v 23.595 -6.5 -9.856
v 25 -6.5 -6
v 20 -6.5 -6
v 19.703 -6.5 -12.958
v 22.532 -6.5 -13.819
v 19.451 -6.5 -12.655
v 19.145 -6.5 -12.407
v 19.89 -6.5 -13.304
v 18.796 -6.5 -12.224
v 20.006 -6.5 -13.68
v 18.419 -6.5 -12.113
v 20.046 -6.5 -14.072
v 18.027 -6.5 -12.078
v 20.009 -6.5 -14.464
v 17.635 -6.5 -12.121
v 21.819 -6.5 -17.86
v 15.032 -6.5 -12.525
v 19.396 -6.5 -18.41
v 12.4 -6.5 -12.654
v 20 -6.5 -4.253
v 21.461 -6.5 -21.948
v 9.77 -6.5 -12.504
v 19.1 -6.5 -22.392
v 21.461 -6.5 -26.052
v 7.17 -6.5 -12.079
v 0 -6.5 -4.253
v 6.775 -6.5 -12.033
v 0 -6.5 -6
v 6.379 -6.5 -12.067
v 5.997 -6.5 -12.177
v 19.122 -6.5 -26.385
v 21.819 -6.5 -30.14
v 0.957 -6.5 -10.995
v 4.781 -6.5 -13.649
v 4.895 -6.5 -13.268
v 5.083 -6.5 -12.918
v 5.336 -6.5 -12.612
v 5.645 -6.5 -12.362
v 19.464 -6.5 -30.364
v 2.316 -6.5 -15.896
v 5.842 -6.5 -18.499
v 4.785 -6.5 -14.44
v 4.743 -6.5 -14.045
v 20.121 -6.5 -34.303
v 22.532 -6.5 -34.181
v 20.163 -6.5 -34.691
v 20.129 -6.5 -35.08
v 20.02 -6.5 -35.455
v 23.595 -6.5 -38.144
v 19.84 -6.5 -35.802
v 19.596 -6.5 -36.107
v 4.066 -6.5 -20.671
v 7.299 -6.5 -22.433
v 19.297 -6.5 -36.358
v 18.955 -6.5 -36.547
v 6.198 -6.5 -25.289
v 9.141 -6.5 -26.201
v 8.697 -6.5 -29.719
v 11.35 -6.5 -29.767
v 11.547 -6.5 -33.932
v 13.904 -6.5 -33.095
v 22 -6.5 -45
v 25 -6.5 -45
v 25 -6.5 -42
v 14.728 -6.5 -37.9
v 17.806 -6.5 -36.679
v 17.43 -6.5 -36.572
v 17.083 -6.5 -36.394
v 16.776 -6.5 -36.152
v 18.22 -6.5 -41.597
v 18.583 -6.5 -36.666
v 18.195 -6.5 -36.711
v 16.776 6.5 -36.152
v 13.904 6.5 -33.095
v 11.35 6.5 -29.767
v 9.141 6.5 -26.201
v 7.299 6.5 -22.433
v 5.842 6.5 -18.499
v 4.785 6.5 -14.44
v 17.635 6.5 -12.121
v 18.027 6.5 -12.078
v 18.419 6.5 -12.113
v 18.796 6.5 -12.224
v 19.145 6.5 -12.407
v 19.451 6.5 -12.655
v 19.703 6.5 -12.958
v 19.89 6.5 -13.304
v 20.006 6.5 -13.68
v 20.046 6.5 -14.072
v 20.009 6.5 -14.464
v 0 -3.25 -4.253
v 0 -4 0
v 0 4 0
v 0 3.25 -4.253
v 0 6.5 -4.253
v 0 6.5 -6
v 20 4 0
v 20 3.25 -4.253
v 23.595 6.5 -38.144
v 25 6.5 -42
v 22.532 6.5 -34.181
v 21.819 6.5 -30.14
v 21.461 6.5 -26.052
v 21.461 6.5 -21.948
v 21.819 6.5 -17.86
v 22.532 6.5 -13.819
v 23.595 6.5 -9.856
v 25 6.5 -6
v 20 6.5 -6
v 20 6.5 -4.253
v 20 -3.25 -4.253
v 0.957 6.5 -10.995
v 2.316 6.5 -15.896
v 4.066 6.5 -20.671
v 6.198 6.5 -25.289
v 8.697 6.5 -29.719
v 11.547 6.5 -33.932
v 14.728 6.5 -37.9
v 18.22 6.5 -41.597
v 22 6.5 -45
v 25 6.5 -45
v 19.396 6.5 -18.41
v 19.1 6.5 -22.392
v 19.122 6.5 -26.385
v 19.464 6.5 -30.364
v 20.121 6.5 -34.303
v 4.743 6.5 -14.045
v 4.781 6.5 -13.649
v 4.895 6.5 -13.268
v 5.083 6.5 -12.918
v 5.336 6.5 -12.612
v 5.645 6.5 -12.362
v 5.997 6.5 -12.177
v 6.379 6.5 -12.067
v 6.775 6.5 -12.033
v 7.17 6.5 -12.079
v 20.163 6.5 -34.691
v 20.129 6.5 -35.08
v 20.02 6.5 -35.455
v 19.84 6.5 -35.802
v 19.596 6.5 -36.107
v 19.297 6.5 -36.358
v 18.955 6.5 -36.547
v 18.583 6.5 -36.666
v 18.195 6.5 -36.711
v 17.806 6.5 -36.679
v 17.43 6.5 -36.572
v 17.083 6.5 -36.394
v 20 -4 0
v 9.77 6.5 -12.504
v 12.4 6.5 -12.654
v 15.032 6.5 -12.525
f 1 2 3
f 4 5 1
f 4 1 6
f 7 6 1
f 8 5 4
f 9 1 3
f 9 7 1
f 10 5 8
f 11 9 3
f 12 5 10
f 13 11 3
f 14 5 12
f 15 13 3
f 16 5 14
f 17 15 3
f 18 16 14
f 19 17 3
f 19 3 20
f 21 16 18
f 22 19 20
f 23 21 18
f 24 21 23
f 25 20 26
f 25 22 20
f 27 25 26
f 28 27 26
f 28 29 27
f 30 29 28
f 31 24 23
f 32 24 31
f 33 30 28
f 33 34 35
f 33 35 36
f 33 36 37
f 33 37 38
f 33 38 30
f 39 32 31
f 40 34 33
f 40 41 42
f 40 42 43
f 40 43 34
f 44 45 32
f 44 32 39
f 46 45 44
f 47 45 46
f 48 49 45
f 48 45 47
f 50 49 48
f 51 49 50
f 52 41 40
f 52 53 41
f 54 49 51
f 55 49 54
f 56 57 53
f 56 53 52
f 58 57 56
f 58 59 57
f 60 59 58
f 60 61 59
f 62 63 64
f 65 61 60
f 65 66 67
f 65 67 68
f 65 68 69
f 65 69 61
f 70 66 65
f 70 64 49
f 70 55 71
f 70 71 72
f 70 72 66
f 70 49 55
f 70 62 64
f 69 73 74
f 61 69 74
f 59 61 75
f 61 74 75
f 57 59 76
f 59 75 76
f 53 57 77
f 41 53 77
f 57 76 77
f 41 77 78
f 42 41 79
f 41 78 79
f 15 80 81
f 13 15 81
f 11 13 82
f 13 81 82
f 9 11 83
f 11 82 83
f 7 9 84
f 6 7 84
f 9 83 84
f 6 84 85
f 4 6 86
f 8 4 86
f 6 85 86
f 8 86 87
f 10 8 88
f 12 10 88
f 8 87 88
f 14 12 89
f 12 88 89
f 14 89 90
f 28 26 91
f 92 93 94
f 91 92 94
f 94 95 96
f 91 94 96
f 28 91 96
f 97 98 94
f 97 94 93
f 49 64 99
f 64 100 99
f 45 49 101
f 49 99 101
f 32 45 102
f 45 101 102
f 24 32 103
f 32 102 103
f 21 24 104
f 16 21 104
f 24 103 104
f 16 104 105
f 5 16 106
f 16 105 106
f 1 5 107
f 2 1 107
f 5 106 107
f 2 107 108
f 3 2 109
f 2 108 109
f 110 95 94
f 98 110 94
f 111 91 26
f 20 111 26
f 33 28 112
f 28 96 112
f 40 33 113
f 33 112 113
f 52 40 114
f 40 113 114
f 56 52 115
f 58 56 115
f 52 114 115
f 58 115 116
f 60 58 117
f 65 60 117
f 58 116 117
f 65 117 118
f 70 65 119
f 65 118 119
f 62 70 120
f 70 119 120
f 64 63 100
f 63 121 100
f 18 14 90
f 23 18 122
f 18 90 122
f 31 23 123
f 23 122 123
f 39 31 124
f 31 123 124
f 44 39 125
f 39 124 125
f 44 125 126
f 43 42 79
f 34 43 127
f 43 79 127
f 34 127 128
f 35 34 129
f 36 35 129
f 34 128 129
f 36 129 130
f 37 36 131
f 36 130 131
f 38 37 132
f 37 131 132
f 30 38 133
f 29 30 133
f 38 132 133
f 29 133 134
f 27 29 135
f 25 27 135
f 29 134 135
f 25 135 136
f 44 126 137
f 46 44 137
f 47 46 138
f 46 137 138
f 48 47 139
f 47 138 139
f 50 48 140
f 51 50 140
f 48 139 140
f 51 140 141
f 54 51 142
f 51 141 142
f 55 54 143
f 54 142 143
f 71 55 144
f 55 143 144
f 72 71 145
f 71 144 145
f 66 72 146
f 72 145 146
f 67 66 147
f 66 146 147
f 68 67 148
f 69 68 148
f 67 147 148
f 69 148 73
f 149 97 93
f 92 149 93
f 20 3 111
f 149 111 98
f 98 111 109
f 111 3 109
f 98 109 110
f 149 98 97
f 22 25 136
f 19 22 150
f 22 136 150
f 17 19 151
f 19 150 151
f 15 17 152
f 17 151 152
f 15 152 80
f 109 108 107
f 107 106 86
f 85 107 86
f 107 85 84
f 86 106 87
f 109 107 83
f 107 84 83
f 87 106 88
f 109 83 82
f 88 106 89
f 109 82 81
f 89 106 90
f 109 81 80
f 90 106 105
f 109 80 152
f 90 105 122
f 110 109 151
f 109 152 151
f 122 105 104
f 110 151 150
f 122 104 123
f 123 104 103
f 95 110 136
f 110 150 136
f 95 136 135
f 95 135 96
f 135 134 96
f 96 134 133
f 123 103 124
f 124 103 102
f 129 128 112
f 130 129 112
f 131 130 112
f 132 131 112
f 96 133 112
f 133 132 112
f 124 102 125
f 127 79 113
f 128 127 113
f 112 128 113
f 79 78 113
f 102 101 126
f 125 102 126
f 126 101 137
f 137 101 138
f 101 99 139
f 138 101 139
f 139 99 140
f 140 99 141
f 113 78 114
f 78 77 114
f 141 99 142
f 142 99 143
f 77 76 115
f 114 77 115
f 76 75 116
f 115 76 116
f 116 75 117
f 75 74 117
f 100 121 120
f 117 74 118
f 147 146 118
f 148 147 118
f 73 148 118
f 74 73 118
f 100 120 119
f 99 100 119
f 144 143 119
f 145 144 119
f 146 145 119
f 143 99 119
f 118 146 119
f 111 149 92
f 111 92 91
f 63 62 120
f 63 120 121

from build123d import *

# Parameters (mm, degrees)
EXTRUDE_1_DEPTH     = 6.5
CUT_EXTRUDE_1_DEPTH = 52.886896226
CUT_EXTRUDE_2_DEPTH = 54.09425581


with BuildPart() as part:
    # 草图1 → 凸台-拉伸1 (new, symmetric)
    with BuildSketch(Plane(origin=(0, 0, 0), x_dir=(1, 0, 0), z_dir=(0, 1, 0))):
        with BuildLine():
            Line((0, 0), (0, 6))
            ThreePointArc((0, 6), (7.402826909, 27.529174564), (22, 45))
            Line((22, 45), (25, 45))
            Line((25, 45), (25, 42))
            ThreePointArc((25, 42), (21.416586692, 24), (25, 6))
            Line((25, 6), (20, 6))
            Line((20, 6), (20, 0))
            Line((20, 0), (0, 0))
        make_face()
    extrude(amount=EXTRUDE_1_DEPTH, both=True)

    # 草图3 → 切除-拉伸1 (cut, through all)
    with BuildSketch(Plane.ZY):
        Polygon((0, 4), (0, 6.5), (-4.253461365, 6.5), (-4.253461365, 3.25), align=None)
        Polygon((0, -4), (-4.253461365, -3.25), (-4.253461365, -6.5), (0, -6.5), align=None)
    extrude(amount=-CUT_EXTRUDE_1_DEPTH, mode=Mode.SUBTRACT)

    # 草图4 → 切除-拉伸2 (cut, through all)
    with BuildSketch(Plane(origin=(0, 6.5, 0), x_dir=(1, 0, 0), z_dir=(0, 1, 0))):
        with BuildLine():
            ThreePointArc((7.169736852, 12.07909507), (12.400276965, 12.65373917), (17.63523501, 12.120841452))
            ThreePointArc((17.63523501, 12.120841452), (19.45114939, 12.654920589), (20.008524733, 14.463820333))
            ThreePointArc((20.008524733, 14.463820333), (19.071107342, 24.389014044), (20.121422197, 34.302896243))
            ThreePointArc((20.121422197, 34.302896243), (19.130864623, 36.4613018), (16.77629627, 36.151581393))
            ThreePointArc((16.77629627, 36.151581393), (9.141463638, 26.201122888), (4.785137328, 14.439970103))
            ThreePointArc((4.785137328, 14.439970103), (5.336190032, 12.611841621), (7.169736852, 12.07909507))
        make_face()
    extrude(amount=-CUT_EXTRUDE_2_DEPTH, mode=Mode.SUBTRACT)


solid = part.part
